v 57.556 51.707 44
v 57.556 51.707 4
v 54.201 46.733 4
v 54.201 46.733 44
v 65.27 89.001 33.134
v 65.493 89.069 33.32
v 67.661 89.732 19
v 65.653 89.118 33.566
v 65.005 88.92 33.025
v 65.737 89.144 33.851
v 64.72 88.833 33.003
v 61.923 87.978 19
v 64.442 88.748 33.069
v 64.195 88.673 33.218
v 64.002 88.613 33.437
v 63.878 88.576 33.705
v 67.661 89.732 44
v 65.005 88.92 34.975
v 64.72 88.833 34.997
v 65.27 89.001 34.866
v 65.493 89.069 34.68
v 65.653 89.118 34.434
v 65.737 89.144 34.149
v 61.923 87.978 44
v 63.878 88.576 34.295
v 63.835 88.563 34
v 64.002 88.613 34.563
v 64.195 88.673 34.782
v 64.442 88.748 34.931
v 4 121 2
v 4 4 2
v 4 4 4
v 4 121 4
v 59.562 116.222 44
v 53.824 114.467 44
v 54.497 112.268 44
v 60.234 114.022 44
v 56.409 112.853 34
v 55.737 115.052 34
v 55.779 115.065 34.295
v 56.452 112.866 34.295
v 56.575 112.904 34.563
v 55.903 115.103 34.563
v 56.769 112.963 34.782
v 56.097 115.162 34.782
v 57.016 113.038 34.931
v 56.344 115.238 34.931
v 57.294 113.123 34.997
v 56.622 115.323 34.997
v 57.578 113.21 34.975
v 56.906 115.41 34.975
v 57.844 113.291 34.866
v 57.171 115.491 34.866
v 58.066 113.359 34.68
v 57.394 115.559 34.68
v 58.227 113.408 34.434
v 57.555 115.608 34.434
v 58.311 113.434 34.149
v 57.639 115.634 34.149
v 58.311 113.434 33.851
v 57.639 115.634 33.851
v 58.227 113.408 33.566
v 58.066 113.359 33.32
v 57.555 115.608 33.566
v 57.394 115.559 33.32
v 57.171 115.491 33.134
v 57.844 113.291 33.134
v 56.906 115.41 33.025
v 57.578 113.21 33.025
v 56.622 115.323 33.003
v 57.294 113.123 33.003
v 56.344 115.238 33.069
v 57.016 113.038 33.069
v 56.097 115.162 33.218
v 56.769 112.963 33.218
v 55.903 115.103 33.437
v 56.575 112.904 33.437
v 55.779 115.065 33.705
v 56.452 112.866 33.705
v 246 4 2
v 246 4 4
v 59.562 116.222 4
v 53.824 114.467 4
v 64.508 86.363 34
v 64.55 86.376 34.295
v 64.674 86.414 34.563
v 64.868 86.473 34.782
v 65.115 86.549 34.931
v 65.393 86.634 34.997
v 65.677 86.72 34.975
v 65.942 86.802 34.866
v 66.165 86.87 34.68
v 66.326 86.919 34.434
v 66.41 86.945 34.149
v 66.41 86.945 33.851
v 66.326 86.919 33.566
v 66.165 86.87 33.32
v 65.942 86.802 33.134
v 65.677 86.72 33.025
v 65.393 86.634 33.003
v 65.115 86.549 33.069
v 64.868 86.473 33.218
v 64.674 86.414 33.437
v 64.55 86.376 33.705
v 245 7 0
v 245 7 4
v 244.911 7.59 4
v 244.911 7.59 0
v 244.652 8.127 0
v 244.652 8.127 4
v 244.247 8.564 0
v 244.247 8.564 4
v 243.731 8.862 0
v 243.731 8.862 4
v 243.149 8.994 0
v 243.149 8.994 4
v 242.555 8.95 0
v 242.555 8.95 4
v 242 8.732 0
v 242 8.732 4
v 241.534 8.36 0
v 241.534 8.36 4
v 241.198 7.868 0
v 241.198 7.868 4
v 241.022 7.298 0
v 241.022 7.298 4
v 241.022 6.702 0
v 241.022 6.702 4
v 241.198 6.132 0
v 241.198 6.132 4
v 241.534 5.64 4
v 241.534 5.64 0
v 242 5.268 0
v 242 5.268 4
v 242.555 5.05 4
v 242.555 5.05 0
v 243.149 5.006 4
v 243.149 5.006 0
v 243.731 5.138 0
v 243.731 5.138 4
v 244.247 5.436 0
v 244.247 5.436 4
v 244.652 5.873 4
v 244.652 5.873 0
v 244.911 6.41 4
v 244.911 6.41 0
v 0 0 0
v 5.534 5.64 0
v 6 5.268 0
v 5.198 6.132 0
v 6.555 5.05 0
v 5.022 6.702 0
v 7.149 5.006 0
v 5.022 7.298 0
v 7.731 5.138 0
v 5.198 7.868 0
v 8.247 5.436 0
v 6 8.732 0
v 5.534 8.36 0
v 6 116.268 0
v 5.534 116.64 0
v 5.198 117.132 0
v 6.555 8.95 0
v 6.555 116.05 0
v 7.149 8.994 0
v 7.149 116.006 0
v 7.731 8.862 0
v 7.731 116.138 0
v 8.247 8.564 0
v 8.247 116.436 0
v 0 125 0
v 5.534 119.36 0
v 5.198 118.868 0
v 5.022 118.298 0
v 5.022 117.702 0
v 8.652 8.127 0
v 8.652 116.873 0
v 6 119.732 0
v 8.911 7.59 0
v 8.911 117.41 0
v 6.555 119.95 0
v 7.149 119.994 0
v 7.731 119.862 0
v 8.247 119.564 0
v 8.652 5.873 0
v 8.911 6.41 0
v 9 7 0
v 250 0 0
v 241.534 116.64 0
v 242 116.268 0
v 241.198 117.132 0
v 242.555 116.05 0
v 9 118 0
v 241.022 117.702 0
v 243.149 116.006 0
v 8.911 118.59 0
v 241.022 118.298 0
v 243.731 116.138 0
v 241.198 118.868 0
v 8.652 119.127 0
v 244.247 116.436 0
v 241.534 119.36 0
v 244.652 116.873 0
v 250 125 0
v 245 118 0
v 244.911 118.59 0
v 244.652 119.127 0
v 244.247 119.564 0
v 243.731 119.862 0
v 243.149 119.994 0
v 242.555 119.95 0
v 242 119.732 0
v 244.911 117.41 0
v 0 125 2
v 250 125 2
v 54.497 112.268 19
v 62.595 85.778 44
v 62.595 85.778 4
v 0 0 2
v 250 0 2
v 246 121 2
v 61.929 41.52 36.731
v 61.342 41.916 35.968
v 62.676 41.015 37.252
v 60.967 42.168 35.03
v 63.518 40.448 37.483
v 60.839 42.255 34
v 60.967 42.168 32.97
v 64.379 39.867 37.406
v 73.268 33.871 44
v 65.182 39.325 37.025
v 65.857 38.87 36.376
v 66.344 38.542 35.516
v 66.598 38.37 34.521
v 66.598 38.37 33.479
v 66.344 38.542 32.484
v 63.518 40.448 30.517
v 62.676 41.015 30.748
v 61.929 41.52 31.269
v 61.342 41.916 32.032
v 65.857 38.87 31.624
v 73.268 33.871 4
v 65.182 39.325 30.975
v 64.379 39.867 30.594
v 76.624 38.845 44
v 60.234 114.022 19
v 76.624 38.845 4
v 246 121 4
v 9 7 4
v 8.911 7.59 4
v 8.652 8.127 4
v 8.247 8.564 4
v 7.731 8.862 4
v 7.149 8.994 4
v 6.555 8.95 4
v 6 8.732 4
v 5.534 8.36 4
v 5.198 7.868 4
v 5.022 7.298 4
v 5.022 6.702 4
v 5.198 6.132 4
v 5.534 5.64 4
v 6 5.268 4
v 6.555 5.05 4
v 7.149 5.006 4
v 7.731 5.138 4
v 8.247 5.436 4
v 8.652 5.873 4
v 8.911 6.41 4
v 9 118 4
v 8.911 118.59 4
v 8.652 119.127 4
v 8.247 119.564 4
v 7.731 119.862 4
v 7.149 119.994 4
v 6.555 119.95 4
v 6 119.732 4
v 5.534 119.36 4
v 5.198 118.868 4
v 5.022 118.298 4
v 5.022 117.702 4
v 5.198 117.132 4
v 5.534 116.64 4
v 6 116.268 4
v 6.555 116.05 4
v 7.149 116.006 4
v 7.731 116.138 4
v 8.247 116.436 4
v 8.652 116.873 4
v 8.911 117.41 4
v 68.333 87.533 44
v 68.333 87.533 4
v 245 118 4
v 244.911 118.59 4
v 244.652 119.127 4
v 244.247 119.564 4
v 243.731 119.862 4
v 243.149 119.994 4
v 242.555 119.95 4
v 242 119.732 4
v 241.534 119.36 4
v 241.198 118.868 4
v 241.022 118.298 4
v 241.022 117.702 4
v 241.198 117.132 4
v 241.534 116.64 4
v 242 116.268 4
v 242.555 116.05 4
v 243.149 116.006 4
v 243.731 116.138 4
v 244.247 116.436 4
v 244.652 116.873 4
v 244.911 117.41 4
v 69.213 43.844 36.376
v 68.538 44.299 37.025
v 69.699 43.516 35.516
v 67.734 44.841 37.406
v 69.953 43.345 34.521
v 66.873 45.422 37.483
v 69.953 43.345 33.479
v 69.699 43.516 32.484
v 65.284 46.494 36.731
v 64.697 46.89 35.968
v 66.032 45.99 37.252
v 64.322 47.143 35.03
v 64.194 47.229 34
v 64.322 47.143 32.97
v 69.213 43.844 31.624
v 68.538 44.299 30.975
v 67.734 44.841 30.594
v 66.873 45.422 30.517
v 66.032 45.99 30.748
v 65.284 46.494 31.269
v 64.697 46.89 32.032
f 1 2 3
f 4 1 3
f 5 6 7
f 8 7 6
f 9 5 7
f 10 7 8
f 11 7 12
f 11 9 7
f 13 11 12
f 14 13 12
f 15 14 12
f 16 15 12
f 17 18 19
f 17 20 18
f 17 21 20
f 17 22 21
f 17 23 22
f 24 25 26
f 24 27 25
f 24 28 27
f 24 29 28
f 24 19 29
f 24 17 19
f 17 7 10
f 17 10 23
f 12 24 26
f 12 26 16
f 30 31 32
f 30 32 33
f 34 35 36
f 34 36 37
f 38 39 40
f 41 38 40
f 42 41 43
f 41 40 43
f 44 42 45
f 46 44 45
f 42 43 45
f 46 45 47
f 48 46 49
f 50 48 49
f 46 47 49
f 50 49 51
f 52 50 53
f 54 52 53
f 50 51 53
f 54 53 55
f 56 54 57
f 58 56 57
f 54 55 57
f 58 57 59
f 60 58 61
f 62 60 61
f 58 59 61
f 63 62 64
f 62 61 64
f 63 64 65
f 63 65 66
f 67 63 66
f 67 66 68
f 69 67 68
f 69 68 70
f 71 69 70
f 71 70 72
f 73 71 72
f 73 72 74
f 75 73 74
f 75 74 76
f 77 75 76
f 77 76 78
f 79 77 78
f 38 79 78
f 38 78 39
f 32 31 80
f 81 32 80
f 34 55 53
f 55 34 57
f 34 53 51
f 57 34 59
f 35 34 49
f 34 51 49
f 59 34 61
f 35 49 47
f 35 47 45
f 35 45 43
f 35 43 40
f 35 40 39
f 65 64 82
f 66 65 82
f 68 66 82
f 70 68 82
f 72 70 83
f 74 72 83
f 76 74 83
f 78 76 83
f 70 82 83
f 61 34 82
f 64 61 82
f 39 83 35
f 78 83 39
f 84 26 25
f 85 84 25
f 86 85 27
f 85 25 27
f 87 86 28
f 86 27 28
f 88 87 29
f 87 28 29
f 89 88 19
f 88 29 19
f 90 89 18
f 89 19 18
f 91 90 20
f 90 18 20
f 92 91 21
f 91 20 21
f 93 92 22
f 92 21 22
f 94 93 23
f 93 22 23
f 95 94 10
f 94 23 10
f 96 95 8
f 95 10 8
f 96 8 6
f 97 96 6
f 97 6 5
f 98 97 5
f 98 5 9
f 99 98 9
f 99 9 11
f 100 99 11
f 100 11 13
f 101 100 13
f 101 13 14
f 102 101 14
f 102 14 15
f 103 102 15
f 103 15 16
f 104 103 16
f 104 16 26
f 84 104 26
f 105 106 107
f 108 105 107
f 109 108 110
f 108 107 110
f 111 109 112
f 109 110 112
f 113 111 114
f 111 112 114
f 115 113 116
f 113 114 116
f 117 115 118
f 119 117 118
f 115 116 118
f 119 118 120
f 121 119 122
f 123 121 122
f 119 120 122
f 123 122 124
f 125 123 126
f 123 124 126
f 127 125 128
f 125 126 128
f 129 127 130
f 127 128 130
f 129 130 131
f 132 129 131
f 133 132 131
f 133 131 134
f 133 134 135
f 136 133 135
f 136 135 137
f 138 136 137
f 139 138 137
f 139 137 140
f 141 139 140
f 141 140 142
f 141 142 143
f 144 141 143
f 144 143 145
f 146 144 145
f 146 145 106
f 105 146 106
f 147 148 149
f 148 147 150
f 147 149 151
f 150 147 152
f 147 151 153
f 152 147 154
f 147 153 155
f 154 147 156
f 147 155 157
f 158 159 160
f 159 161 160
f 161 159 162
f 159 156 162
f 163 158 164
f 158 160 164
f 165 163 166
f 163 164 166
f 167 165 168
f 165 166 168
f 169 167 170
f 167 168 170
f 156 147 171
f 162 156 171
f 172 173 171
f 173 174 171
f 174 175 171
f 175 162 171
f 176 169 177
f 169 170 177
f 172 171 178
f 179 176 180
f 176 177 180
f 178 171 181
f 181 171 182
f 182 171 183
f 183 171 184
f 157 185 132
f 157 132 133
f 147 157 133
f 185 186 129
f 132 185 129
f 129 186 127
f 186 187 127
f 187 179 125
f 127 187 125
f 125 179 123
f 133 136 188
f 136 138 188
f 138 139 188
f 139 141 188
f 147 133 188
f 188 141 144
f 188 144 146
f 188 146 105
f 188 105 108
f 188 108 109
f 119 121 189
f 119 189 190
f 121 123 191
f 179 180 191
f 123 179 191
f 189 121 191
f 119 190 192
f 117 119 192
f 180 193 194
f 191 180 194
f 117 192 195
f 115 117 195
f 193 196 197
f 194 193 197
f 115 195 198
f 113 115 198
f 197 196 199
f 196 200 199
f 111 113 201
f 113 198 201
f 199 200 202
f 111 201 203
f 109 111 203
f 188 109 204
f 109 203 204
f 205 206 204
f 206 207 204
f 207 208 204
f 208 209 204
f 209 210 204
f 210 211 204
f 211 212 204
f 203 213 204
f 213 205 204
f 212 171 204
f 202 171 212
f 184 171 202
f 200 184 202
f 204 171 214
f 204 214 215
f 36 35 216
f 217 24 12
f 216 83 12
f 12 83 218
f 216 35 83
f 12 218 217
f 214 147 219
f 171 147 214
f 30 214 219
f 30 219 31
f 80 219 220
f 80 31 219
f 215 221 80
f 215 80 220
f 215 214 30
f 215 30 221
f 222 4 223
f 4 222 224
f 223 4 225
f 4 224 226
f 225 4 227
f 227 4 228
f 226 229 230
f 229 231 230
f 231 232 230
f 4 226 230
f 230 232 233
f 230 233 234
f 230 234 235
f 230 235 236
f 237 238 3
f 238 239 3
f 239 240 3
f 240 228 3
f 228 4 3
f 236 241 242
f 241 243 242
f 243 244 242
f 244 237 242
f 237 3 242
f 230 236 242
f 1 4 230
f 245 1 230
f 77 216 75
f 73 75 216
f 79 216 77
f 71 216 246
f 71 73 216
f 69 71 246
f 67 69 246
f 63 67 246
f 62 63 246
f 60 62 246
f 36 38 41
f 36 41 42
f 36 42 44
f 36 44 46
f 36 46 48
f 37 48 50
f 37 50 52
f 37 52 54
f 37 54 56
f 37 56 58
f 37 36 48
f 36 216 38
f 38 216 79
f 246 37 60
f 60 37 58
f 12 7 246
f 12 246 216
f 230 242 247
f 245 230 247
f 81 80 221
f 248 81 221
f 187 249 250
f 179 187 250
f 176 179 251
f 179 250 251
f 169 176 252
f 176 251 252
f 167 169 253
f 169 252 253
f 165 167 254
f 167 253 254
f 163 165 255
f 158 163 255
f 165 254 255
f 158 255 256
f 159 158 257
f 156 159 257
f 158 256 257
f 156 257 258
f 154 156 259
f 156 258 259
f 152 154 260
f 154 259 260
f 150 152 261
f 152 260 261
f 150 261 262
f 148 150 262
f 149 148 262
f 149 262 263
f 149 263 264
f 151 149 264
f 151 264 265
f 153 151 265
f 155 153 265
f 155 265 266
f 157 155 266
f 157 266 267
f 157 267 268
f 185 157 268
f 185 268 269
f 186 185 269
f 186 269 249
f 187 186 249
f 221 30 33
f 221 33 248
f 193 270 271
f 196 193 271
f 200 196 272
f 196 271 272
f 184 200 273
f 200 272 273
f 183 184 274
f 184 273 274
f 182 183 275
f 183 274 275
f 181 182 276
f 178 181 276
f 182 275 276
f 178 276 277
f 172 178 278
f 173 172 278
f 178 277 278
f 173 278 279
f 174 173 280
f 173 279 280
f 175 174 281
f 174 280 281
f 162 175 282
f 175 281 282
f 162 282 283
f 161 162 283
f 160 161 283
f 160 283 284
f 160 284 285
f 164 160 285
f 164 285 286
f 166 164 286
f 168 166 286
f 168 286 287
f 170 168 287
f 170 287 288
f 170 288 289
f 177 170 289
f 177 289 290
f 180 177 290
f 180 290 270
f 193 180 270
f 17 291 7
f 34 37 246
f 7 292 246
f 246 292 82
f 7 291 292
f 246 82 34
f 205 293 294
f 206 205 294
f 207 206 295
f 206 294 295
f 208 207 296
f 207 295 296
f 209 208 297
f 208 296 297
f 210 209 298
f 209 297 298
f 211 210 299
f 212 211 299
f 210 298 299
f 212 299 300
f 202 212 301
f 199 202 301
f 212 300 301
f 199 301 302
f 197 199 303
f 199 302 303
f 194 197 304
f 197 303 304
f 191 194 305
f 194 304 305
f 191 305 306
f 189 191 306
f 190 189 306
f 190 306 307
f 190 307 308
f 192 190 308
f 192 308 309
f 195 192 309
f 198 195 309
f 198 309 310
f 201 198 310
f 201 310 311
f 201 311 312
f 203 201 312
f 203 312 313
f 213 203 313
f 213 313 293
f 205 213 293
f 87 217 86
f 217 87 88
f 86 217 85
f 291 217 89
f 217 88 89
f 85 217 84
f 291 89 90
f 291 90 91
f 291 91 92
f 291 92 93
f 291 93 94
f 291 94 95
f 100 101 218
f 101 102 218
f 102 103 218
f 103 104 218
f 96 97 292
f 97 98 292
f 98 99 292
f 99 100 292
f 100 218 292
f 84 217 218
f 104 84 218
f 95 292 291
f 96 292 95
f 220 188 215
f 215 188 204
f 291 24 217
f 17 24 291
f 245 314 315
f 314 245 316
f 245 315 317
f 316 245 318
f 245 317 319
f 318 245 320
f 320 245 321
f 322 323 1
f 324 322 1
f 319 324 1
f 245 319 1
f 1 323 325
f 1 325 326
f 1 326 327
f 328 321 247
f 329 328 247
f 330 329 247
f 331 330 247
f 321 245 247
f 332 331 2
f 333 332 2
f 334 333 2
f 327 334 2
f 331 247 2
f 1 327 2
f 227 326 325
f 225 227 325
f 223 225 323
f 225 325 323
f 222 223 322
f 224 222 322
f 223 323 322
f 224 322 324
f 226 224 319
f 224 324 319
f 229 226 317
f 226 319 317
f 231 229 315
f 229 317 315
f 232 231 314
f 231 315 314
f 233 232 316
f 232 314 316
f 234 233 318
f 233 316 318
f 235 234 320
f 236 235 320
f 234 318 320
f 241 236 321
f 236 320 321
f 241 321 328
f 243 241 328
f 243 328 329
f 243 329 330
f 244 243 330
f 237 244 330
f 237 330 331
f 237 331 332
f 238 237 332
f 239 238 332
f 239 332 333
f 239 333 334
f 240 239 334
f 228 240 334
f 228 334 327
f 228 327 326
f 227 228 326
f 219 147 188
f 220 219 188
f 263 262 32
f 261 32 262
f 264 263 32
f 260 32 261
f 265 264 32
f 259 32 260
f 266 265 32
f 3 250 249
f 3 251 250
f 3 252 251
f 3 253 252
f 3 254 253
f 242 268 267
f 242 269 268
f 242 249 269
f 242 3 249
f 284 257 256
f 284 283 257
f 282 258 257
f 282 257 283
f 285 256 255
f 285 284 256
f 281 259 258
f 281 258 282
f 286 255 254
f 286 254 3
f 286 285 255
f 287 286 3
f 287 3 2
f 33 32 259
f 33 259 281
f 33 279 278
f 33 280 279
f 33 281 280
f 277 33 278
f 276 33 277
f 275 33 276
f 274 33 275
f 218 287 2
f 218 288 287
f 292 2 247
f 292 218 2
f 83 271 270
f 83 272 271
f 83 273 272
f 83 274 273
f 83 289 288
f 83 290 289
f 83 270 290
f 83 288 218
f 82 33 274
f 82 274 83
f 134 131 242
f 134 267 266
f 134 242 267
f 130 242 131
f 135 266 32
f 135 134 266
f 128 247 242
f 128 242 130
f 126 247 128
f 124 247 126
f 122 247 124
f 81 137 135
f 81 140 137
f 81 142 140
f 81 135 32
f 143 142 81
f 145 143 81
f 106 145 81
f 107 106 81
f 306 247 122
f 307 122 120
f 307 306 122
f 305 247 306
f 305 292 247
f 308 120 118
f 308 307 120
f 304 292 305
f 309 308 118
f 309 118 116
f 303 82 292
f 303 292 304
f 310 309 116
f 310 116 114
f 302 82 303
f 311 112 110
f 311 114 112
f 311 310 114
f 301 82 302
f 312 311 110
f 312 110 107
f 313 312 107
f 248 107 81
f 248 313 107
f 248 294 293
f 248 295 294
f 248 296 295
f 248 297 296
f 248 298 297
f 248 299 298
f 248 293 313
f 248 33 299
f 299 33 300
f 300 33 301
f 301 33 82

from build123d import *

# Parameters (mm, degrees)
SKIZZE1_W                       = 250
SKIZZE1_H                       = 125
AUFSATZ_LINEAR_AUSTRAGEN1_DEPTH = 2
SKIZZE2_W                       = 242
SKIZZE2_H                       = 117
AUFSATZ_LINEAR_AUSTRAGEN2_DEPTH = 2
SKIZZE3_R                       = 2
SCHNITT_LINEAR_AUSTRAGEN1_DEPTH = 32
AUFSATZ_LINEAR_AUSTRAGEN3_DEPTH = 40
SCHNITT_LINEAR_AUSTRAGEN2_DEPTH = 25
SKIZZE8_R                       = 1
SCHNITT_LINEAR_AUSTRAGEN3_DEPTH = 40
SKIZZE9_R                       = 3.493135661
SCHNITT_LINEAR_AUSTRAGEN4_DEPTH = 20


with BuildPart() as part:
    # Skizze1 → Aufsatz-Linear austragen1 (new body)
    with BuildSketch(Plane.XY):
        with Locations((125, 62.5)):
            Rectangle(SKIZZE1_W, SKIZZE1_H)
    extrude(amount=AUFSATZ_LINEAR_AUSTRAGEN1_DEPTH)

    # Skizze2 → Aufsatz-Linear austragen2 (add)
    with BuildSketch(Plane.XY.offset(2)):
        with Locations((125, 62.5)):
            Rectangle(SKIZZE2_W, SKIZZE2_H)
    extrude(amount=AUFSATZ_LINEAR_AUSTRAGEN2_DEPTH)

    # Skizze3 → Schnitt-Linear austragen1 (cut)
    with BuildSketch(Plane.XY.offset(4)):
        with Locations((7, 118)):
            Circle(SKIZZE3_R)
        with Locations((7, 7)):
            Circle(SKIZZE3_R)
        with Locations((243, 7)):
            Circle(SKIZZE3_R)
        with Locations((243, 118)):
            Circle(SKIZZE3_R)
    extrude(amount=-SCHNITT_LINEAR_AUSTRAGEN1_DEPTH, mode=Mode.SUBTRACT)

    # Skizze4 → Aufsatz-Linear austragen3 (add)
    with BuildSketch(Plane.XY.offset(4)):
        Polygon((62.595258591, 85.778313546), (68.333087126, 87.532543775), (59.561935985, 116.221686454), (53.824107449, 114.467456225), align=None)
        Polygon((54.200560001, 46.732563956), (73.26842417, 33.871127177), (76.623581591, 38.845352612), (57.555717422, 51.706789392), align=None)
    extrude(amount=AUFSATZ_LINEAR_AUSTRAGEN3_DEPTH)

    # Skizze7 → Schnitt-Linear austragen2 (cut)
    with BuildSketch(Plane.XY.offset(44)):
        Polygon((54.49656237, 112.267955287), (60.234390906, 114.022185515), (67.660632206, 89.732044713), (61.92280367, 87.977814485), align=None)
    extrude(amount=-SCHNITT_LINEAR_AUSTRAGEN2_DEPTH, mode=Mode.SUBTRACT)

    # Skizze8 → Schnitt-Linear austragen3 (cut)
    with BuildSketch(Plane(origin=(-27.403744567, 89.633609675, 0), x_dir=(0.9563047559630352, 0.2923717047227376, 0), z_dir=(-0.29237170472273766, 0.9563047559630353, 0))):
        with Locations(Location((87.939295251, -34, 0), (0, 0, 180))):
            Circle(SKIZZE8_R)
    extrude(amount=-SCHNITT_LINEAR_AUSTRAGEN3_DEPTH, mode=Mode.SUBTRACT)

    # Skizze9 → Schnitt-Linear austragen4 (cut)
    with BuildSketch(Plane(origin=(41.968333241, 62.220612777, 0), x_dir=(0.8290375725550413, -0.5591929034707476, 0), z_dir=(0.5591929034707476, 0.8290375725550413, 0))):
        with Locations(Location((30.301782569, -34, 0), (0, 0, 180))):
            Circle(SKIZZE9_R)
    extrude(amount=-SCHNITT_LINEAR_AUSTRAGEN4_DEPTH, mode=Mode.SUBTRACT)


solid = part.part
